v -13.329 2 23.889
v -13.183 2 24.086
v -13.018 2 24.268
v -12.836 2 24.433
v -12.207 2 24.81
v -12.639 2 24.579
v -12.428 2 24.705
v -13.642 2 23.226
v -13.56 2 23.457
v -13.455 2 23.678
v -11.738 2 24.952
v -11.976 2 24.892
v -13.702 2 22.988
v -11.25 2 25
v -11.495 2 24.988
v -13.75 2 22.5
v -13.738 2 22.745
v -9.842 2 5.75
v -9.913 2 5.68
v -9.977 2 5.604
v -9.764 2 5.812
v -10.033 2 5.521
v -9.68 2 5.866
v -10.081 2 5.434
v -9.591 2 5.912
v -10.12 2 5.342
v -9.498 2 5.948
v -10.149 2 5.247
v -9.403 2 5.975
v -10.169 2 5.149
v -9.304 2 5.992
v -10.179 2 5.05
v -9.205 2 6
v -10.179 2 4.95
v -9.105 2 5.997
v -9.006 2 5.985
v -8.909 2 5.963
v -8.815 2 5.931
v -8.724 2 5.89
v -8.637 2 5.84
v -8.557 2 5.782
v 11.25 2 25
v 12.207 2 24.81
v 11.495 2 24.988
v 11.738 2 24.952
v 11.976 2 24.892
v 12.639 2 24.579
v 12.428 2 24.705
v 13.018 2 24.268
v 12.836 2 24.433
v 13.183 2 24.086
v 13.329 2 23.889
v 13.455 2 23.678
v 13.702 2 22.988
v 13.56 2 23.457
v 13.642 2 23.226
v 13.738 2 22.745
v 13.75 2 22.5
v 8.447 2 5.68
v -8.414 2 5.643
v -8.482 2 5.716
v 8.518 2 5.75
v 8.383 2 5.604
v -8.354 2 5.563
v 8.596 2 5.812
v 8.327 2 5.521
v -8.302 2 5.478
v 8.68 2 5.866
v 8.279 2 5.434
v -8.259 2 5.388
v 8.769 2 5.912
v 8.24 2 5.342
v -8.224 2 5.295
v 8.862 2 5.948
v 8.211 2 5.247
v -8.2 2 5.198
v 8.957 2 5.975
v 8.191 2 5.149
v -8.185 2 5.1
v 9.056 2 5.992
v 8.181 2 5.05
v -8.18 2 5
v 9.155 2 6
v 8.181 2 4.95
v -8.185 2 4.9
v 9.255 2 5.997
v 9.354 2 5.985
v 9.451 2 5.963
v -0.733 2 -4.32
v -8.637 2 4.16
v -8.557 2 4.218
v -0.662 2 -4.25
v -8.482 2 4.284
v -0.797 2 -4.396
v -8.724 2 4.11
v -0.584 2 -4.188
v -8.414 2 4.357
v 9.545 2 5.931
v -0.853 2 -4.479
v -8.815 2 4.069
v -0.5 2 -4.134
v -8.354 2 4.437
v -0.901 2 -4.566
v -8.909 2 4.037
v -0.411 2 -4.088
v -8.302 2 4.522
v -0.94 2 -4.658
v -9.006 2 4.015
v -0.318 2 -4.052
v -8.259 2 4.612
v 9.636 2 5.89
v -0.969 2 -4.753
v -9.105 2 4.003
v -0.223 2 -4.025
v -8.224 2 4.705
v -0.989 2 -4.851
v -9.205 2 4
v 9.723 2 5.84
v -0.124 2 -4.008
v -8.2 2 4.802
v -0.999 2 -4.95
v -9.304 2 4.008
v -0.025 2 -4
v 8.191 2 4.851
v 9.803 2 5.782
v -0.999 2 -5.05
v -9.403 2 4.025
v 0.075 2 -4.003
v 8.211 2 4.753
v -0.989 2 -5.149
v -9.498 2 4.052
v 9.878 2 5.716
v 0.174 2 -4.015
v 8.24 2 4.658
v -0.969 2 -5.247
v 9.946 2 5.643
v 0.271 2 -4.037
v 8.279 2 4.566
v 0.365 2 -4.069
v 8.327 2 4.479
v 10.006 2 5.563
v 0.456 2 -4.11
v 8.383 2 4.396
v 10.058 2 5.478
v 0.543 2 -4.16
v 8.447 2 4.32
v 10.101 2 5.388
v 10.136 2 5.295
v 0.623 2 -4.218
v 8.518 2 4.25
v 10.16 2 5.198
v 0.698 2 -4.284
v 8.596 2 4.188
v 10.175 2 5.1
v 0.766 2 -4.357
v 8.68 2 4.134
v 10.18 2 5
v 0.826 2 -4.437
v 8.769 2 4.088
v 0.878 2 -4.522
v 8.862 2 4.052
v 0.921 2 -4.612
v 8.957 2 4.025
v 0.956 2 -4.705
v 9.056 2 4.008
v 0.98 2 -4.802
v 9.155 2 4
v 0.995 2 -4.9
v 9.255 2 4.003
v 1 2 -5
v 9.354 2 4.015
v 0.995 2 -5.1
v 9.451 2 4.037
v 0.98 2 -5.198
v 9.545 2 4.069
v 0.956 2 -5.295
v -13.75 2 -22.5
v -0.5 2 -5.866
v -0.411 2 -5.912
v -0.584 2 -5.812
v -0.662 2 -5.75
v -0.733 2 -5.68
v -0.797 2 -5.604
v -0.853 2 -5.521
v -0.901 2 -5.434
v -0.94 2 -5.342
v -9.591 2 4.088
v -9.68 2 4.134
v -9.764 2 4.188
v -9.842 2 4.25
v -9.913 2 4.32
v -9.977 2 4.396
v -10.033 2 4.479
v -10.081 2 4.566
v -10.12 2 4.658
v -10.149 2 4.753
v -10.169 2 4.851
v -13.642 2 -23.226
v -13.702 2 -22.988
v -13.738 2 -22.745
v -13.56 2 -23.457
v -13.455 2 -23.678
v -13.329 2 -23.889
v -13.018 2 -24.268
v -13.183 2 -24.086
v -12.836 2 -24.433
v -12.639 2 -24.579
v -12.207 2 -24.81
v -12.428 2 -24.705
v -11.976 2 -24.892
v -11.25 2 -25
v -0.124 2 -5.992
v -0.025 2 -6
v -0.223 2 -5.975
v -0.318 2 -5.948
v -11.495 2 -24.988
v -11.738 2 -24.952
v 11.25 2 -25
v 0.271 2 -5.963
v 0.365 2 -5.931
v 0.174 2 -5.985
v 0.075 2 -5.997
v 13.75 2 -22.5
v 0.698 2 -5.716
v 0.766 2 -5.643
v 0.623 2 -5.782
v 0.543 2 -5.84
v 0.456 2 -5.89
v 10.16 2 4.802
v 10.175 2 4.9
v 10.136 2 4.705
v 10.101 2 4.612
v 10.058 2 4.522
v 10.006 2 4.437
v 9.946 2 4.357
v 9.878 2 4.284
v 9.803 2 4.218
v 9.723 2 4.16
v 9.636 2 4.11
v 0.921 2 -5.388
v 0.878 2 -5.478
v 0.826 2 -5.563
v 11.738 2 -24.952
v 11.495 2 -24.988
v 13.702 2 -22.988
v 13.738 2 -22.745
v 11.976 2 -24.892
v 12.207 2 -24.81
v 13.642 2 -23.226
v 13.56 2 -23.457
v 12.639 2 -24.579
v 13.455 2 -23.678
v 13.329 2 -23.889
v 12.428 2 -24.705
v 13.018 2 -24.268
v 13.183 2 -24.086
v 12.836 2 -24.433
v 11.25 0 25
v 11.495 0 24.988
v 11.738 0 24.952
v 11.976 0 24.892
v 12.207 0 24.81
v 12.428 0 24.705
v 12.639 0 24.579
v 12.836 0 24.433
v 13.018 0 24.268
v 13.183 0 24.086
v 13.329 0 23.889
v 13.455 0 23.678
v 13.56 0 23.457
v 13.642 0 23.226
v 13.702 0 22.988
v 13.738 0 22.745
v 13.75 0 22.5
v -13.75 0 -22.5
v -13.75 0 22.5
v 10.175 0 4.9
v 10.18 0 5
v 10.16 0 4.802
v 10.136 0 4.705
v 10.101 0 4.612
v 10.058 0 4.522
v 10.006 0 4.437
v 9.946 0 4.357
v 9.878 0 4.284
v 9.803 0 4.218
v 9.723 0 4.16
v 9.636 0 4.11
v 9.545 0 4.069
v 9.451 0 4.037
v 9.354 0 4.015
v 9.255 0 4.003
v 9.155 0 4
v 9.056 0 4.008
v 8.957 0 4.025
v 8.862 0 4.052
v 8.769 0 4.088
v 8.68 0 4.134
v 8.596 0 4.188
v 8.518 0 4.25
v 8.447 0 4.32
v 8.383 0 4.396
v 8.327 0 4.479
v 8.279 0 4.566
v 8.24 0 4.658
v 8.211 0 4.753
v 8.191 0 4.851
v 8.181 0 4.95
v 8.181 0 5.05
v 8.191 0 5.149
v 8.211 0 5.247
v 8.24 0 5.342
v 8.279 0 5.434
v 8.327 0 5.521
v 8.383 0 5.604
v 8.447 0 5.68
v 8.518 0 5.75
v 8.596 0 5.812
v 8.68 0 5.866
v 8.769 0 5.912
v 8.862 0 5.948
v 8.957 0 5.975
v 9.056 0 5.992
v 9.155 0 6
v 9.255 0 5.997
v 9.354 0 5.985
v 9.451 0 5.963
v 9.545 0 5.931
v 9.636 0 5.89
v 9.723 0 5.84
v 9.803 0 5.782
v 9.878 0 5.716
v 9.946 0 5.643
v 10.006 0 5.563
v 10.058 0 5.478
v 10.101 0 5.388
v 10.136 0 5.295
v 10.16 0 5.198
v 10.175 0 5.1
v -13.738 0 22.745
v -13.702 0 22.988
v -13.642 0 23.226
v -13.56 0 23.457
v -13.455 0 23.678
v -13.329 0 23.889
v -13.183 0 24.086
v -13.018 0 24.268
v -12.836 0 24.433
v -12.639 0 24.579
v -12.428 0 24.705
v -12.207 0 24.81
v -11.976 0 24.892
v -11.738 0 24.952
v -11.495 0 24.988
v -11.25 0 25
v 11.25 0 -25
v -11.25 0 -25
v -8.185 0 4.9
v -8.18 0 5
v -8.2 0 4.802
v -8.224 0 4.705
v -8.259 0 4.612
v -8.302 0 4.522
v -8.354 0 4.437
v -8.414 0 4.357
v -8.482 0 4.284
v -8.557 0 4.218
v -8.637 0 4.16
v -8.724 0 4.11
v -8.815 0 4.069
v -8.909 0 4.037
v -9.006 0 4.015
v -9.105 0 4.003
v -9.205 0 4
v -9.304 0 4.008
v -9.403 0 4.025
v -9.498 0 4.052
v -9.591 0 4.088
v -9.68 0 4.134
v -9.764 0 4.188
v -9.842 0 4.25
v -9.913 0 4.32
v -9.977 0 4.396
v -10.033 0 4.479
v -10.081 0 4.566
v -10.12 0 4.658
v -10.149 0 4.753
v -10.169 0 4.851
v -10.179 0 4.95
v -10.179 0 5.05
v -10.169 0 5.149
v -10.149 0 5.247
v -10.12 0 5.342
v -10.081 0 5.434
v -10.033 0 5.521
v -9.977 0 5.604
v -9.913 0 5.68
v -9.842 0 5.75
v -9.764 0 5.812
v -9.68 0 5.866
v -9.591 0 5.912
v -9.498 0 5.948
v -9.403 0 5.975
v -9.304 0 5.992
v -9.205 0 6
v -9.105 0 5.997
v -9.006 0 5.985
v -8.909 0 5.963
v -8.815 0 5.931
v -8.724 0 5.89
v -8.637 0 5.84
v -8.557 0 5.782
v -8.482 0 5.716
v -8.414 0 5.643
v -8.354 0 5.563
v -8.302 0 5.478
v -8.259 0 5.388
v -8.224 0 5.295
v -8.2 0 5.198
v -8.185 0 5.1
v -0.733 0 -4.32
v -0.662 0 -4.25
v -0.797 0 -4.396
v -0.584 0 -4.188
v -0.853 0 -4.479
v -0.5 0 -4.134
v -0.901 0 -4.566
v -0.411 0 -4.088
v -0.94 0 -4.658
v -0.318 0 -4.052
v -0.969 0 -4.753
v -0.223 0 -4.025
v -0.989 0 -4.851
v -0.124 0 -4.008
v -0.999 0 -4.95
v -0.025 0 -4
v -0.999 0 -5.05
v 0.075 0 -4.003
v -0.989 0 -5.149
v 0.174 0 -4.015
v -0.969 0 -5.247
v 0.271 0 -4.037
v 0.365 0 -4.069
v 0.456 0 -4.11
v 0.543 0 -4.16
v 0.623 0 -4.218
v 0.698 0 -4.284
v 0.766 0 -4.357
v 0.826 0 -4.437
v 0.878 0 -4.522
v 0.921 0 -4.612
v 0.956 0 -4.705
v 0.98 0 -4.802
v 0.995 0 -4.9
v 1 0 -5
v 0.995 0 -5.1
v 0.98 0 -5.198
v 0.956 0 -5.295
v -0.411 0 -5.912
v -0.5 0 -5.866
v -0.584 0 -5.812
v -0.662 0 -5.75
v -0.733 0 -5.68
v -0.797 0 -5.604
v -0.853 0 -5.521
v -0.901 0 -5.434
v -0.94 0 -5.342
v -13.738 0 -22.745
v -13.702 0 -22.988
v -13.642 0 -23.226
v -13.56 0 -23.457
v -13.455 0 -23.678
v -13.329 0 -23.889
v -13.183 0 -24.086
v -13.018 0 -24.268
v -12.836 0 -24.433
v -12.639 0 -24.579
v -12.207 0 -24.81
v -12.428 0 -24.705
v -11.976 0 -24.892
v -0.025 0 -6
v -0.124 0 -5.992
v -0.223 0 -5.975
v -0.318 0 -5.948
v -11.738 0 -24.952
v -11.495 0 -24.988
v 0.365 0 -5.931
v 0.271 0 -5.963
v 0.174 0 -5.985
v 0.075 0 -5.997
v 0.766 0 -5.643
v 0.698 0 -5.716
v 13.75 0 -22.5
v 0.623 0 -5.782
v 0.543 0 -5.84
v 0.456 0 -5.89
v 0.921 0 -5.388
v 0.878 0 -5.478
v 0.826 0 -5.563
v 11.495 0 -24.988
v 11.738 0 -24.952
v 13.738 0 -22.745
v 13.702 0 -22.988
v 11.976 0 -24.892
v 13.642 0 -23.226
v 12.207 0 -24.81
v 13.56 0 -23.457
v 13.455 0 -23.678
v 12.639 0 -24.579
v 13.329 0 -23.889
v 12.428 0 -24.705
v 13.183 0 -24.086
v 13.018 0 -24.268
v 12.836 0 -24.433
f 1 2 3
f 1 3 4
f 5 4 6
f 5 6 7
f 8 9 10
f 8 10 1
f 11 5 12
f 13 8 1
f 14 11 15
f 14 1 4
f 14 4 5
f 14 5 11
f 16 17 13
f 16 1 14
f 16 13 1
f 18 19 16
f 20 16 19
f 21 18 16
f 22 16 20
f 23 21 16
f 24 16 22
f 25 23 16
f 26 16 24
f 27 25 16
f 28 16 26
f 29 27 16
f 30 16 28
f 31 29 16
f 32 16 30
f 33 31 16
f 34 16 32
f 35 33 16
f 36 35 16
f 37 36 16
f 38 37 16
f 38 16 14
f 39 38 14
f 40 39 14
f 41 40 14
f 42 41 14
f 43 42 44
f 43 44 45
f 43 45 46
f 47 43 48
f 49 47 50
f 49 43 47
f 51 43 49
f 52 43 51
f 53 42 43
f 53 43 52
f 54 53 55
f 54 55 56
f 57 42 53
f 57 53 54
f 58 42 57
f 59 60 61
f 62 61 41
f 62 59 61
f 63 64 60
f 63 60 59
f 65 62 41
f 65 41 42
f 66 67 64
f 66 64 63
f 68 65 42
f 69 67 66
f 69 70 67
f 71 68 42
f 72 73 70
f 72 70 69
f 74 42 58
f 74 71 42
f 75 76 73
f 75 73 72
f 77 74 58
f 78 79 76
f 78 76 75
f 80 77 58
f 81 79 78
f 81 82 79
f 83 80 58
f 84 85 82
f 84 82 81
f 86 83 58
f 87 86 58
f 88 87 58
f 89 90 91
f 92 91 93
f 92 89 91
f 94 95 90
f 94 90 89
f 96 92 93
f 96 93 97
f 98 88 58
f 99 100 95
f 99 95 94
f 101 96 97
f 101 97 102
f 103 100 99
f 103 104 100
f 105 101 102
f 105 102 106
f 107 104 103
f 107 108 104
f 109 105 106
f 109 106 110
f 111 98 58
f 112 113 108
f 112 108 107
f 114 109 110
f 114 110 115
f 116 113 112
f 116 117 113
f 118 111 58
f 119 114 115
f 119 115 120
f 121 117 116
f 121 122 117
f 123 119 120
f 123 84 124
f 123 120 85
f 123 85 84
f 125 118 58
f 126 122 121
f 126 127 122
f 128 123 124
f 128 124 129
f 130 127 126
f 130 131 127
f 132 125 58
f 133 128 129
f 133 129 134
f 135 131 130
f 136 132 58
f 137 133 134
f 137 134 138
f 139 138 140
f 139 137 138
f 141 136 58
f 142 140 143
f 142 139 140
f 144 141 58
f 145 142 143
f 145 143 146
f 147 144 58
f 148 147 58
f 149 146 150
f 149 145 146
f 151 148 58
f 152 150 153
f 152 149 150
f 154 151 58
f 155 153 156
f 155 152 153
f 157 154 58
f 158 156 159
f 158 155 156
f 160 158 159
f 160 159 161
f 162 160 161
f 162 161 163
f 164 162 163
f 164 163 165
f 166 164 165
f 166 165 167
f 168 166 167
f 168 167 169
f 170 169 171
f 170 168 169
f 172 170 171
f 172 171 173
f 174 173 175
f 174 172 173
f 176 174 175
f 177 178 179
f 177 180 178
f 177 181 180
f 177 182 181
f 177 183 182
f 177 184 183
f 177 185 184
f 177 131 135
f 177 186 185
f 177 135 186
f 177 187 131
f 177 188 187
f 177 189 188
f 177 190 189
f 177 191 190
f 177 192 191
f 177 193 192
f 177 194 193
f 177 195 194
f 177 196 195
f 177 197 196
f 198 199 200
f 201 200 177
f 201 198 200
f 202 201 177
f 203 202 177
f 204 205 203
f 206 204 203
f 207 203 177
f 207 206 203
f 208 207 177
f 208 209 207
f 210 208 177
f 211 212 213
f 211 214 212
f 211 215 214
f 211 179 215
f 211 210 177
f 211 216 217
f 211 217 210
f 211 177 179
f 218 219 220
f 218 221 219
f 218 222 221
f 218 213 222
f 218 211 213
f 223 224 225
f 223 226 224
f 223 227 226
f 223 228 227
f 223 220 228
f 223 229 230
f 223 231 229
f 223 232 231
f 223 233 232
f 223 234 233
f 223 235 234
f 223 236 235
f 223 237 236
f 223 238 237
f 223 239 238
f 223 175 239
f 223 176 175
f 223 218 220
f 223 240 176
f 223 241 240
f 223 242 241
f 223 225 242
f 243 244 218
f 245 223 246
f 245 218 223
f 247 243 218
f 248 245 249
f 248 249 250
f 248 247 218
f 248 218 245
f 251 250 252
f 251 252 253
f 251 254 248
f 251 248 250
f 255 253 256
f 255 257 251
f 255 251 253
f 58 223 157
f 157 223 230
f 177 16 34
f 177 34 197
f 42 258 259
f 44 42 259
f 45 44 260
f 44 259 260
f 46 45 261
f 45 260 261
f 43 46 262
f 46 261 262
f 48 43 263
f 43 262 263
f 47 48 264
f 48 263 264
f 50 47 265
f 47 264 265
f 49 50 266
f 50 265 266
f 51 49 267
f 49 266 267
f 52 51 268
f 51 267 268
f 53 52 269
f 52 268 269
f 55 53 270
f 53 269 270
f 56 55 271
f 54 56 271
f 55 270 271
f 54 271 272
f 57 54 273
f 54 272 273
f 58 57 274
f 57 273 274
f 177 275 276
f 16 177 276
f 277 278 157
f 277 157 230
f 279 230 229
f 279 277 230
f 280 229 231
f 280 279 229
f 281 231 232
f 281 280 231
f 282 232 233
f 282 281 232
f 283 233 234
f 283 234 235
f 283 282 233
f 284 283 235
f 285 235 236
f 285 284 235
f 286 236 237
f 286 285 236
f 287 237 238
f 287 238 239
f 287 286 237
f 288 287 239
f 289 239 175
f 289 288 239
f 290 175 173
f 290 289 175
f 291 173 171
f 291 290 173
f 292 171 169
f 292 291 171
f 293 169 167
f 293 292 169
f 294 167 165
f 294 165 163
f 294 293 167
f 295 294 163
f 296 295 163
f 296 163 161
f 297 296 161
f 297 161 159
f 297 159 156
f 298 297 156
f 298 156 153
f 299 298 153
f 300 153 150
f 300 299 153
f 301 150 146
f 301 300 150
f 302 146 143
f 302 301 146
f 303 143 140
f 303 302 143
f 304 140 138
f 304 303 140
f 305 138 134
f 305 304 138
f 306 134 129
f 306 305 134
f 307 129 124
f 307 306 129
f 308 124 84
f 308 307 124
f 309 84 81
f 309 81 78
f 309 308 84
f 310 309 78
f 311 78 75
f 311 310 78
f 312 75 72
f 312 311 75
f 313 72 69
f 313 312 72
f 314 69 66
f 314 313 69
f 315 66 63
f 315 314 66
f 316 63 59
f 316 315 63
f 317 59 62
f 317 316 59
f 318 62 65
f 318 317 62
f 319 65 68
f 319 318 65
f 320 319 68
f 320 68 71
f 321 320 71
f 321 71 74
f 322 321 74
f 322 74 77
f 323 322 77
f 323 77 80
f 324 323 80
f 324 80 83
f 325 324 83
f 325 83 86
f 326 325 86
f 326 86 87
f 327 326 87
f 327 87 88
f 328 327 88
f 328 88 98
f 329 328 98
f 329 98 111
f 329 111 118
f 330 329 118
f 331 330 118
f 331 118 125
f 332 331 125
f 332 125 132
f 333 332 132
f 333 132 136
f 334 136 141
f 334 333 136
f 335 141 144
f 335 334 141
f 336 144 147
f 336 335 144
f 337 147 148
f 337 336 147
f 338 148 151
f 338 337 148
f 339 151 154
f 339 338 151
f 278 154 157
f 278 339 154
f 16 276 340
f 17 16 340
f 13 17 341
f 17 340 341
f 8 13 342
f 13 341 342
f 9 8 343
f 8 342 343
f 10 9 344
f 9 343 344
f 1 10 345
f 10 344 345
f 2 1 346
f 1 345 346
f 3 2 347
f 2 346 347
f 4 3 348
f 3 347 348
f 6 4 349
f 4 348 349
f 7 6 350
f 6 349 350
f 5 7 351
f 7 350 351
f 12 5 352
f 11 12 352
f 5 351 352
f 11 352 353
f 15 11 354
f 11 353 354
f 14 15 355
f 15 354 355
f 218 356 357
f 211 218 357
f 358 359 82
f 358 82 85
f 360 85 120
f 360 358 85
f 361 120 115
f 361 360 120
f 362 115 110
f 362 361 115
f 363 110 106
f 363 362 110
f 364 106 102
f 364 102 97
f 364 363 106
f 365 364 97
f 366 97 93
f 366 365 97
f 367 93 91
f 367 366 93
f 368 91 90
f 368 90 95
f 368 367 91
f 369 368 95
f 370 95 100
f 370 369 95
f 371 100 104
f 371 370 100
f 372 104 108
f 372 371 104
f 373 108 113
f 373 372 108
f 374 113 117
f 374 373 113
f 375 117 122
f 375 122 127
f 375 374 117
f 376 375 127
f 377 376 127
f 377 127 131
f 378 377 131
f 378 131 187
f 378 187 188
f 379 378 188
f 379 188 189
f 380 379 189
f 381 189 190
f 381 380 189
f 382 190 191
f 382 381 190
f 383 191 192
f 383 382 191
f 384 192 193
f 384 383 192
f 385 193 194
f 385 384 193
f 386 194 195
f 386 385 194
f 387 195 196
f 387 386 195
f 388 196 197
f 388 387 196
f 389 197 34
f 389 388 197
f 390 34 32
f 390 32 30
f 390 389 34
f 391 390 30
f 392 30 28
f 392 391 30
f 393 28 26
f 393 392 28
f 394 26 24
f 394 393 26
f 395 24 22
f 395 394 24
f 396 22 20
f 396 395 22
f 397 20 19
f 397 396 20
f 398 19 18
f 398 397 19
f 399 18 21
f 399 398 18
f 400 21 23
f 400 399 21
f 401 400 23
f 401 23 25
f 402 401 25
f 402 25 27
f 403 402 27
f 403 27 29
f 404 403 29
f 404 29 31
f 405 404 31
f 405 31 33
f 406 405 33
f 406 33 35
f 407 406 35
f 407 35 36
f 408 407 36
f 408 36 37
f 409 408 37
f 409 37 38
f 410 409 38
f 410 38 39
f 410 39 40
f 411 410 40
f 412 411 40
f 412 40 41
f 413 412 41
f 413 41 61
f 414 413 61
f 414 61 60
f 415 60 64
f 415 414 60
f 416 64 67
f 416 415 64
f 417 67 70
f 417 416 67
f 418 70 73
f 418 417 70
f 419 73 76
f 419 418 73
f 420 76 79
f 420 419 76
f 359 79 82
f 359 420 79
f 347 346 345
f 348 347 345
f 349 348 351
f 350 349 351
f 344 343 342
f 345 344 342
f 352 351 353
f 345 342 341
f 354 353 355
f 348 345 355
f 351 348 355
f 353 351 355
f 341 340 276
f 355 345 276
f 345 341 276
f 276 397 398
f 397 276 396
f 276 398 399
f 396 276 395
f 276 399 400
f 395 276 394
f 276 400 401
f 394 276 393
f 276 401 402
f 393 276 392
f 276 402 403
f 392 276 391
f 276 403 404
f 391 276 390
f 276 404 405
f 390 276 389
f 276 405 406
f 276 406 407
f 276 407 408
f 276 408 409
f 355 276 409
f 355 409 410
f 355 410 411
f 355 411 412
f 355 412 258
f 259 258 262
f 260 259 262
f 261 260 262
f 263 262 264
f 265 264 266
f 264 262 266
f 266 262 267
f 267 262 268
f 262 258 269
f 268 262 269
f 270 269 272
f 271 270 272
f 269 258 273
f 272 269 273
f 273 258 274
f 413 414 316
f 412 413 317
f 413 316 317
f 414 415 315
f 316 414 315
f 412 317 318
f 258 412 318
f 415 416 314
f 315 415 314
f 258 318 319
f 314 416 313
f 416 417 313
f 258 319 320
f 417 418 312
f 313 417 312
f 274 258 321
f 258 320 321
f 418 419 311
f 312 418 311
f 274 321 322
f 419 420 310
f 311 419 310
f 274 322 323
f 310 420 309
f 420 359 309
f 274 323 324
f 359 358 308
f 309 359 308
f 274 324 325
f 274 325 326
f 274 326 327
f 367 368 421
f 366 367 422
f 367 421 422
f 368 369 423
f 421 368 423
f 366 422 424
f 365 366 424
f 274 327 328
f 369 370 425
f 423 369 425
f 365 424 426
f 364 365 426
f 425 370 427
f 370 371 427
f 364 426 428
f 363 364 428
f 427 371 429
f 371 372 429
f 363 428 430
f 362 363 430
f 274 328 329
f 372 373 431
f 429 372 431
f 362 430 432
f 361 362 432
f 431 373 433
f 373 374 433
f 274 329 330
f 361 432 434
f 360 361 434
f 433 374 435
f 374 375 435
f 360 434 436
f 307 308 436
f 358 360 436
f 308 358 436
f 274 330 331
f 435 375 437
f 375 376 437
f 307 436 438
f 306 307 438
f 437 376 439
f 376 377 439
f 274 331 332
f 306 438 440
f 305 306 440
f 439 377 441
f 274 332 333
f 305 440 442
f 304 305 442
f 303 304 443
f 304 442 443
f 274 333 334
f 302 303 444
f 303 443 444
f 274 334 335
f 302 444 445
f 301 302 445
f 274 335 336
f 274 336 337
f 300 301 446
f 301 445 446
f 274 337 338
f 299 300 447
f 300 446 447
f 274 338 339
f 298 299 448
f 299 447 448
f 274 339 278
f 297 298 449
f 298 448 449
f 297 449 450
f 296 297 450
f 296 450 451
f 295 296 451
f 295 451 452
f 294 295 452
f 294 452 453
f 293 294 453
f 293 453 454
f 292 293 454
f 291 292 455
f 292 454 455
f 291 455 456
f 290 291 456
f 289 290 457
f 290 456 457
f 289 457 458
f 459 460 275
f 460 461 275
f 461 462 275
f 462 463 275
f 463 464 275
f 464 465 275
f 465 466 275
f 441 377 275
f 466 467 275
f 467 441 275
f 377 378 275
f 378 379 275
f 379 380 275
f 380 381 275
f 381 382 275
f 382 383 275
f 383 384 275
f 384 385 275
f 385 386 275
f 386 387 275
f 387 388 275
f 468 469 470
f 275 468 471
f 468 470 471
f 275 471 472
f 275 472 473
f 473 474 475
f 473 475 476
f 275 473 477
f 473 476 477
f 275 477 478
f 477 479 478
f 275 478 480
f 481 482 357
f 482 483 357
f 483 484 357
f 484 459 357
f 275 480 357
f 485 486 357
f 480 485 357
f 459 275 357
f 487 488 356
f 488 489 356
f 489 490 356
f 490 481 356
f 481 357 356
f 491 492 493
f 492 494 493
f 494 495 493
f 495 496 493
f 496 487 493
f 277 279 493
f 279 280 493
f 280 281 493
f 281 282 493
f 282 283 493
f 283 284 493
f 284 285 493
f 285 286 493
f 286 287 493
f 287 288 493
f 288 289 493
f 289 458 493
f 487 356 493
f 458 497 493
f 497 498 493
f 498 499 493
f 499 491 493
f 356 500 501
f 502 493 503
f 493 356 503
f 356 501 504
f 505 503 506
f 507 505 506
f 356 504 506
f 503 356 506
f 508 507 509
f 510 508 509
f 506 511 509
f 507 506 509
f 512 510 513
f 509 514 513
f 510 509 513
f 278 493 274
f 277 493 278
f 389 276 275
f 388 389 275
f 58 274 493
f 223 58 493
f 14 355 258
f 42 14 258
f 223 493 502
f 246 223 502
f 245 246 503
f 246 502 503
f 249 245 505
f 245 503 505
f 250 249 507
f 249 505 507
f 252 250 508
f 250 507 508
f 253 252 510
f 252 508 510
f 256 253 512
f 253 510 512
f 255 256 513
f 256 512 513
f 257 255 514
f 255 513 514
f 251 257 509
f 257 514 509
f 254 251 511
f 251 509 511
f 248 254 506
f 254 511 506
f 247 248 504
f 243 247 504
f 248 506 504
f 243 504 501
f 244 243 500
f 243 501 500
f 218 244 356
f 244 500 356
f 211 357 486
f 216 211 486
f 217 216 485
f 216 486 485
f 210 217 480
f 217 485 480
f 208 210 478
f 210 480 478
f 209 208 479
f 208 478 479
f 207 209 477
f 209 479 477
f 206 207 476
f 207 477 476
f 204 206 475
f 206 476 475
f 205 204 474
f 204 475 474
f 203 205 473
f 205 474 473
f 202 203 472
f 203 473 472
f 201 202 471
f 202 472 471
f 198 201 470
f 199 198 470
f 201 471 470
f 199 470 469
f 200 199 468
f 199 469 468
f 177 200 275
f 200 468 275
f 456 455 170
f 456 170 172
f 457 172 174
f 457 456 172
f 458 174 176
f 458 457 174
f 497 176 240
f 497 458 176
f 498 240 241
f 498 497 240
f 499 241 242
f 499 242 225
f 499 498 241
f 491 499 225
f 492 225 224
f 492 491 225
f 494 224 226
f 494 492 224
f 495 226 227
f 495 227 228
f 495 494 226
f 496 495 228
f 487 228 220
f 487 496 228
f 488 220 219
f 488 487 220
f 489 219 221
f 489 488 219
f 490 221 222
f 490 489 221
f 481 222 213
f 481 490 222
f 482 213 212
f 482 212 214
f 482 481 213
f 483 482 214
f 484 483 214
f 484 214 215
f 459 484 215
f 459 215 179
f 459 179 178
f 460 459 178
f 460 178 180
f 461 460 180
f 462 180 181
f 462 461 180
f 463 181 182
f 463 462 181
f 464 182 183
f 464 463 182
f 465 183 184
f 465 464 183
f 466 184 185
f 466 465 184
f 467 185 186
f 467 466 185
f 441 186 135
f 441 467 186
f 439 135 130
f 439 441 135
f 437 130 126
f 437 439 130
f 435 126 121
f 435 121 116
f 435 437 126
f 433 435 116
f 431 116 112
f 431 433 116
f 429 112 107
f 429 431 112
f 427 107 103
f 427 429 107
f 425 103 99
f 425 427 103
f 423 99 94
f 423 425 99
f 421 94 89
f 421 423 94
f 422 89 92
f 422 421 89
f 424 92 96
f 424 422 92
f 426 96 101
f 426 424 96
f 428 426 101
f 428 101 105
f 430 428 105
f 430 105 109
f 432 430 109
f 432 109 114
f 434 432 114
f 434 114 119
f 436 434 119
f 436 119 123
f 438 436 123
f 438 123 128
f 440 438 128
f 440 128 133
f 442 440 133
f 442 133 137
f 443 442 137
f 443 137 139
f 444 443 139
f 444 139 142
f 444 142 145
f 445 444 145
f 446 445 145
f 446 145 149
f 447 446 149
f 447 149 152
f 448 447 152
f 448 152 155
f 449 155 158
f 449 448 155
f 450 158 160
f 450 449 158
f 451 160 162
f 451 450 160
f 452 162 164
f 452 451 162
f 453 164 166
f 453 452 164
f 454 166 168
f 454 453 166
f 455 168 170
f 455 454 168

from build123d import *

# Parameters (mm, degrees)
SKETCH1_R           = 1
BOSS_EXTRUDE1_DEPTH = 2


with BuildPart() as part:
    # Sketch1 → Boss-Extrude1 (new body)
    with BuildSketch(Plane(origin=(0, 0, 0), x_dir=(1, 0, 0), z_dir=(0, 1, 0))):
        with BuildLine():
            Line((-11.25, -25), (11.25, -25))
            ThreePointArc((11.25, -25), (13.017766953, -24.267766953), (13.75, -22.5))
            Line((13.75, -22.5), (13.75, 22.5))
            ThreePointArc((13.75, 22.5), (13.017766953, 24.267766953), (11.25, 25))
            Line((11.25, 25), (-11.25, 25))
            ThreePointArc((-11.25, 25), (-13.017766953, 24.267766953), (-13.75, 22.5))
            Line((-13.75, 22.5), (-13.75, -22.5))
            ThreePointArc((-13.75, -22.5), (-13.017766953, -24.267766953), (-11.25, -25))
        make_face()
        with Locations((0, 5)):
            Circle(SKETCH1_R, mode=Mode.SUBTRACT)
        with Locations((-9.18, -5)):
            Circle(SKETCH1_R, mode=Mode.SUBTRACT)
        with Locations((9.18, -5)):
            Circle(SKETCH1_R, mode=Mode.SUBTRACT)
    extrude(amount=BOSS_EXTRUDE1_DEPTH)


solid = part.part
